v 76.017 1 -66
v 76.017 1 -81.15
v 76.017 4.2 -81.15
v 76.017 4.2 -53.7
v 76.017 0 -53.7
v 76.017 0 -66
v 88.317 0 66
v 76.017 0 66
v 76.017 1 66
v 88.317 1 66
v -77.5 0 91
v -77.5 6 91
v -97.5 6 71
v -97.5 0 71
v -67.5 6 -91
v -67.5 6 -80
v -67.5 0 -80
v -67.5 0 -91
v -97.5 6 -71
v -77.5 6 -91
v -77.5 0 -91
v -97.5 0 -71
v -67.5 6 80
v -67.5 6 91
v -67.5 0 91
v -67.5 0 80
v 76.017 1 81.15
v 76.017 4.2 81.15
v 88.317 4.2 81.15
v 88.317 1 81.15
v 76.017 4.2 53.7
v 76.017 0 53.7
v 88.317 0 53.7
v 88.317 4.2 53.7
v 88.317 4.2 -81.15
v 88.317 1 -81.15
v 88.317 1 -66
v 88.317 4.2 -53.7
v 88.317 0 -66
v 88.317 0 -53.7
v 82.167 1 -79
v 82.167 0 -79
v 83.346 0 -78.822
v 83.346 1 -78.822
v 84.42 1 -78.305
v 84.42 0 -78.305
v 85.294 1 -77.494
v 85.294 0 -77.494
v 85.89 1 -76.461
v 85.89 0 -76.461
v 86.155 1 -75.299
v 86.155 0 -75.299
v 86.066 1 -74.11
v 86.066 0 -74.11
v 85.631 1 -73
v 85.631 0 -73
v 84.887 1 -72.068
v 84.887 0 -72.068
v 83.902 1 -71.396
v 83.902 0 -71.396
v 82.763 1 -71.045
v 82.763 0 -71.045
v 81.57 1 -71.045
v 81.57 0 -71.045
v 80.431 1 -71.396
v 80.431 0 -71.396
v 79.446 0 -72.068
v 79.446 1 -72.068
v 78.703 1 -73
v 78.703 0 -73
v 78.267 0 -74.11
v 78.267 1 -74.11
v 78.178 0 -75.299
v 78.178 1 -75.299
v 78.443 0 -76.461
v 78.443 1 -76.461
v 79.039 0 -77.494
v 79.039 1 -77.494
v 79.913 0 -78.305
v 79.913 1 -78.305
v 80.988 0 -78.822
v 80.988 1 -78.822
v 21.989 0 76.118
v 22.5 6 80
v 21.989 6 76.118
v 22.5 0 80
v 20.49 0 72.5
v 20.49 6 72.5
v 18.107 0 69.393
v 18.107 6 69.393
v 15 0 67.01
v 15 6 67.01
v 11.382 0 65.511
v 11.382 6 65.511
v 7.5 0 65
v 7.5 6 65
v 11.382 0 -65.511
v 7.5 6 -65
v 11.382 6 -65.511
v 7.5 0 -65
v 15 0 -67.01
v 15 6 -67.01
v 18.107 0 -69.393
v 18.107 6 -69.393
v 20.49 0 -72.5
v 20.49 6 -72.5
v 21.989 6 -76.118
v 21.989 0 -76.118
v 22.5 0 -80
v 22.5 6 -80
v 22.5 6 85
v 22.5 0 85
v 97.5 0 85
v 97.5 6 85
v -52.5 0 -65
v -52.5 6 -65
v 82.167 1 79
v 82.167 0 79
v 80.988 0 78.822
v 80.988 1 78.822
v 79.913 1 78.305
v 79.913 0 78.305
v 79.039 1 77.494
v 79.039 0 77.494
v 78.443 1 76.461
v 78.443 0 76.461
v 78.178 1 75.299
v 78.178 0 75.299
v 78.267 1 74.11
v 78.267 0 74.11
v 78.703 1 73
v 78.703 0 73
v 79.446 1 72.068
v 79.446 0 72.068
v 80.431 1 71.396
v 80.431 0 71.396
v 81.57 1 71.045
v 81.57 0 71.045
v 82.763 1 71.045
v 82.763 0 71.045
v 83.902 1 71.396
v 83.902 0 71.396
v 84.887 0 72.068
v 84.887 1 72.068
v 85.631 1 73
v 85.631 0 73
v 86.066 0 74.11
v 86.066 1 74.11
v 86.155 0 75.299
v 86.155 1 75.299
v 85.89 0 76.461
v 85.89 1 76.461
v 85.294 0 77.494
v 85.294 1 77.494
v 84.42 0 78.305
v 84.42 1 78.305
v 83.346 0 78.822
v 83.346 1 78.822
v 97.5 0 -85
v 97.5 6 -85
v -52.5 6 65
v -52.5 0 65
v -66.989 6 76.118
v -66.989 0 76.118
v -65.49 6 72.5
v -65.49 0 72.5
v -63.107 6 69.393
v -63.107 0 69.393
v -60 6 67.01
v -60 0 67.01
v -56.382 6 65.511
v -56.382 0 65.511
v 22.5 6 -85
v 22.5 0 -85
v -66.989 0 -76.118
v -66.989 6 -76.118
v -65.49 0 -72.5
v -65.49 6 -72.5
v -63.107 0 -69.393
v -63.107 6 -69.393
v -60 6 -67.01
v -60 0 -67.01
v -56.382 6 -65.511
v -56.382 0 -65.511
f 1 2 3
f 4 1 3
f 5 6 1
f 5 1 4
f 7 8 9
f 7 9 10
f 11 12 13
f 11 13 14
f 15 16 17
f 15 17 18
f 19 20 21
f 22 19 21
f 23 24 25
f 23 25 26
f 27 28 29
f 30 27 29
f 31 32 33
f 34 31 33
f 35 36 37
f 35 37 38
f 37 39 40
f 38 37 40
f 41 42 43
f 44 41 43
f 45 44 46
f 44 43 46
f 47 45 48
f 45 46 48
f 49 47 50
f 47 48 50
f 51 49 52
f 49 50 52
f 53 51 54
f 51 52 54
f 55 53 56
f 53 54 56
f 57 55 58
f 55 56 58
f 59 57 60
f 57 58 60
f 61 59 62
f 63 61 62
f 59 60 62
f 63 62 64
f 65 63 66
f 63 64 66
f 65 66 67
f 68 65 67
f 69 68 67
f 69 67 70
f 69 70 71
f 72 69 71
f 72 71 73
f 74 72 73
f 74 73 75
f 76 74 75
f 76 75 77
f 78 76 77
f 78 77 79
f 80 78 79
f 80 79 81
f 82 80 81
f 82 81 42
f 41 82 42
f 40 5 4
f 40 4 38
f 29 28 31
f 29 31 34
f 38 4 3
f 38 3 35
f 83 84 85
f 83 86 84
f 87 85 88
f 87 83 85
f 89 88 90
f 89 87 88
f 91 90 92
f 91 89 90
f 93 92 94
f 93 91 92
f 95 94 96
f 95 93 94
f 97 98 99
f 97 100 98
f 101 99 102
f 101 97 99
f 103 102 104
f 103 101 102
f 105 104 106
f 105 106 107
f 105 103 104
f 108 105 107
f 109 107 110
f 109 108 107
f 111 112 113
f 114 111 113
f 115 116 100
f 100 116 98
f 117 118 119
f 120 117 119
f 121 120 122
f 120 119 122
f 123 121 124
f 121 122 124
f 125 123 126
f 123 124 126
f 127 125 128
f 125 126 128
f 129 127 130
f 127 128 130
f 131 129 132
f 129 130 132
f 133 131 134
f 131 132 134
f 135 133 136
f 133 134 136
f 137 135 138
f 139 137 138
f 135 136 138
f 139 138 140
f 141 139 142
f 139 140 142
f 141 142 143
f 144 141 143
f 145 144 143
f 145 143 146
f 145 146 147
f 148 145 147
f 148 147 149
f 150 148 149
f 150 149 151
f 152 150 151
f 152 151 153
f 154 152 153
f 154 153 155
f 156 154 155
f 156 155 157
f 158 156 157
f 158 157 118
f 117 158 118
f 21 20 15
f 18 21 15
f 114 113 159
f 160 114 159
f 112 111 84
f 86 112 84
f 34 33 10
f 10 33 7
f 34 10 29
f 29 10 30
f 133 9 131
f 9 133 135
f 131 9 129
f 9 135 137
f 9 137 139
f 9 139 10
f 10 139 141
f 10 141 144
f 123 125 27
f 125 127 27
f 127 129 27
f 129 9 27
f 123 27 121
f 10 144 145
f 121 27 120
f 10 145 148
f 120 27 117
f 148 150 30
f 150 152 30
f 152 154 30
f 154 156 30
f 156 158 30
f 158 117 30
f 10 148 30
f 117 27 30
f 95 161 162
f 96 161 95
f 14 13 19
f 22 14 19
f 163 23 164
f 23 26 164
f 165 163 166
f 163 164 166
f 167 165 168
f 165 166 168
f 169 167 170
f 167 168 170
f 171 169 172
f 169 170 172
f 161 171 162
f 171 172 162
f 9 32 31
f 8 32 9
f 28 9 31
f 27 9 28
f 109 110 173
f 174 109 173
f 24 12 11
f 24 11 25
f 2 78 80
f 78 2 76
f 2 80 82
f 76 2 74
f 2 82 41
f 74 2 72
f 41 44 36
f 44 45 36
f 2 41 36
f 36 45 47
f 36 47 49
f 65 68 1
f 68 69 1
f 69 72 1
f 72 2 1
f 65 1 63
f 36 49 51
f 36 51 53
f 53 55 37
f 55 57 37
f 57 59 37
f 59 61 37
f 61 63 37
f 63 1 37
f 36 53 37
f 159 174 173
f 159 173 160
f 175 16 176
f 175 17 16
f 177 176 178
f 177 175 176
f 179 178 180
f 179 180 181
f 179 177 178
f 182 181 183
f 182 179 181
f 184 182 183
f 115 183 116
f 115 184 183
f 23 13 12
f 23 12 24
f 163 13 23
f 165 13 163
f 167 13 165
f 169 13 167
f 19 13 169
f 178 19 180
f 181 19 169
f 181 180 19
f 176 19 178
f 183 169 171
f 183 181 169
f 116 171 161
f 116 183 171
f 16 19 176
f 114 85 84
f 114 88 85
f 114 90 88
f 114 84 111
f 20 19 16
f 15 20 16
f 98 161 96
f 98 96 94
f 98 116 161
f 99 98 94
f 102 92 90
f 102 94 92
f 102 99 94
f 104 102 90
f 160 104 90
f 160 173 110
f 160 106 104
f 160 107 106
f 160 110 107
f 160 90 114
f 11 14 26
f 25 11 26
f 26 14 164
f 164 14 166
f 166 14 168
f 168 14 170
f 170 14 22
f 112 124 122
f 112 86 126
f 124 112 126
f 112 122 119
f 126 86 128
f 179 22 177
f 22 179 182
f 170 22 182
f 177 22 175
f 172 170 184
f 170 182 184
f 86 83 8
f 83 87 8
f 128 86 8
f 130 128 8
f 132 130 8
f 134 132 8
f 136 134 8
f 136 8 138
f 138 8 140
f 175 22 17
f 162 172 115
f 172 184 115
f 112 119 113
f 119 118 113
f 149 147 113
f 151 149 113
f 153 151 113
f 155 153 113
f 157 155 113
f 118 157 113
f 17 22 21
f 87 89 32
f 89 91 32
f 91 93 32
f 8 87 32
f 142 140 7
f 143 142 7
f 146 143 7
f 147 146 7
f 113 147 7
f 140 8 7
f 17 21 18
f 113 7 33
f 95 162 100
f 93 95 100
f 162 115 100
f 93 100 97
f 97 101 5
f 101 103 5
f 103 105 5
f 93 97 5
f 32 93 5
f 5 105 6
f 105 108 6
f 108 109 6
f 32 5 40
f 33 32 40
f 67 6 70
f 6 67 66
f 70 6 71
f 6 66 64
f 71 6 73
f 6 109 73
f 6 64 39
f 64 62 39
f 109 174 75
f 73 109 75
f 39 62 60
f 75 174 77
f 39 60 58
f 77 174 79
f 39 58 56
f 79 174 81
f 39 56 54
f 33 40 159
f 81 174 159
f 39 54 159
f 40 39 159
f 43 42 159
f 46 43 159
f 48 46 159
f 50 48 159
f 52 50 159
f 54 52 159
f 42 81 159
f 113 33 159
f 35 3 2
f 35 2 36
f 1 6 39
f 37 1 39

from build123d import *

# Parameters (mm, degrees)
SKETCH1_W           = 195
SKETCH1_H           = 170
BOSS_EXTRUDE1_DEPTH = 6
SKETCH2_W           = 90
SKETCH2_H           = 20
CUT_EXTRUDE1_DEPTH  = 130.48841647
FILLET1_R           = 15
SKETCH3_W           = 30
SKETCH3_H           = 6
BOSS_EXTRUDE2_DEPTH = 6
CHAMFER1_SIZE       = 20
SKETCH4_R           = 4
CUT_EXTRUDE2_DEPTH  = 4.2
SKETCH5_W           = 12.3
SKETCH5_H           = 12.3
CUT_EXTRUDE3_DEPTH  = 4.2
SKETCH6_W           = 12.3
SKETCH6_H           = 15.15
CUT_EXTRUDE4_DEPTH  = 3.2


with BuildPart() as part:
    # Sketch1 → Boss-Extrude1 (new body)
    with BuildSketch(Plane(origin=(0, 0, 0), x_dir=(1, 0, 0), z_dir=(0, 1, 0))):
        Rectangle(SKETCH1_W, SKETCH1_H)
    extrude(amount=BOSS_EXTRUDE1_DEPTH)

    # Sketch2 → Cut-Extrude1 (cut, through all)
    with BuildSketch(Plane(origin=(0, 6, 0), x_dir=(1, 0, 0), z_dir=(0, 1, 0))):
        with Locations((-22.5, -75)):
            Rectangle(SKETCH2_W, SKETCH2_H)
        with Locations((-22.5, 75)):
            Rectangle(SKETCH2_W, SKETCH2_H)
    extrude(amount=-CUT_EXTRUDE1_DEPTH, mode=Mode.SUBTRACT)

    # Fillet1
    fillet1_edges = [part.edges().sort_by_distance(p)[0] for p in [
        (-67.5, 3, 65),
        (22.5, 3, 65),
        (-67.5, 3, -65),
        (22.5, 3, -65),
    ]]
    fillet(fillet1_edges, radius=FILLET1_R)

    # Sketch3 → Boss-Extrude2 (add)
    with BuildSketch(Plane(origin=(0, 6, 0), x_dir=(1, 0, 0), z_dir=(0, 1, 0))):
        with Locations((-82.5, 88)):
            Rectangle(SKETCH3_W, SKETCH3_H)
        with Locations((-82.5, -88)):
            Rectangle(SKETCH3_W, SKETCH3_H)
    extrude(amount=-BOSS_EXTRUDE2_DEPTH)

    # Chamfer1
    chamfer1_edges = [part.edges().sort_by_distance(p)[0] for p in [
        (-97.5, 3, -91),
        (-97.5, 3, 91),
    ]]
    chamfer(chamfer1_edges, length=CHAMFER1_SIZE)

    # Sketch4 → Cut-Extrude2 (cut)
    with BuildSketch(Plane.XZ):
        with Locations(Location((82.166666667, -75, 0), (0, 0, 270))):
            Circle(SKETCH4_R)
        with Locations(Location((82.166666667, 75, 0), (0, 0, 90))):
            Circle(SKETCH4_R)
    extrude(amount=-CUT_EXTRUDE2_DEPTH, mode=Mode.SUBTRACT)

    # Sketch5 → Cut-Extrude3 (cut)
    with BuildSketch(Plane.XZ):
        with Locations((82.166666667, 59.85)):
            Rectangle(SKETCH5_W, SKETCH5_H)
        with Locations((82.166666667, -59.85)):
            Rectangle(SKETCH5_W, SKETCH5_H)
    extrude(amount=-CUT_EXTRUDE3_DEPTH, mode=Mode.SUBTRACT)

    # Sketch6 → Cut-Extrude4 (cut)
    with BuildSketch(Plane.XZ.offset(-4.2)):
        with Locations((82.166666667, -73.575)):
            Rectangle(SKETCH6_W, SKETCH6_H)
        with Locations((82.166666667, 73.575)):
            Rectangle(SKETCH6_W, SKETCH6_H)
    extrude(amount=CUT_EXTRUDE4_DEPTH, mode=Mode.SUBTRACT)


solid = part.part
